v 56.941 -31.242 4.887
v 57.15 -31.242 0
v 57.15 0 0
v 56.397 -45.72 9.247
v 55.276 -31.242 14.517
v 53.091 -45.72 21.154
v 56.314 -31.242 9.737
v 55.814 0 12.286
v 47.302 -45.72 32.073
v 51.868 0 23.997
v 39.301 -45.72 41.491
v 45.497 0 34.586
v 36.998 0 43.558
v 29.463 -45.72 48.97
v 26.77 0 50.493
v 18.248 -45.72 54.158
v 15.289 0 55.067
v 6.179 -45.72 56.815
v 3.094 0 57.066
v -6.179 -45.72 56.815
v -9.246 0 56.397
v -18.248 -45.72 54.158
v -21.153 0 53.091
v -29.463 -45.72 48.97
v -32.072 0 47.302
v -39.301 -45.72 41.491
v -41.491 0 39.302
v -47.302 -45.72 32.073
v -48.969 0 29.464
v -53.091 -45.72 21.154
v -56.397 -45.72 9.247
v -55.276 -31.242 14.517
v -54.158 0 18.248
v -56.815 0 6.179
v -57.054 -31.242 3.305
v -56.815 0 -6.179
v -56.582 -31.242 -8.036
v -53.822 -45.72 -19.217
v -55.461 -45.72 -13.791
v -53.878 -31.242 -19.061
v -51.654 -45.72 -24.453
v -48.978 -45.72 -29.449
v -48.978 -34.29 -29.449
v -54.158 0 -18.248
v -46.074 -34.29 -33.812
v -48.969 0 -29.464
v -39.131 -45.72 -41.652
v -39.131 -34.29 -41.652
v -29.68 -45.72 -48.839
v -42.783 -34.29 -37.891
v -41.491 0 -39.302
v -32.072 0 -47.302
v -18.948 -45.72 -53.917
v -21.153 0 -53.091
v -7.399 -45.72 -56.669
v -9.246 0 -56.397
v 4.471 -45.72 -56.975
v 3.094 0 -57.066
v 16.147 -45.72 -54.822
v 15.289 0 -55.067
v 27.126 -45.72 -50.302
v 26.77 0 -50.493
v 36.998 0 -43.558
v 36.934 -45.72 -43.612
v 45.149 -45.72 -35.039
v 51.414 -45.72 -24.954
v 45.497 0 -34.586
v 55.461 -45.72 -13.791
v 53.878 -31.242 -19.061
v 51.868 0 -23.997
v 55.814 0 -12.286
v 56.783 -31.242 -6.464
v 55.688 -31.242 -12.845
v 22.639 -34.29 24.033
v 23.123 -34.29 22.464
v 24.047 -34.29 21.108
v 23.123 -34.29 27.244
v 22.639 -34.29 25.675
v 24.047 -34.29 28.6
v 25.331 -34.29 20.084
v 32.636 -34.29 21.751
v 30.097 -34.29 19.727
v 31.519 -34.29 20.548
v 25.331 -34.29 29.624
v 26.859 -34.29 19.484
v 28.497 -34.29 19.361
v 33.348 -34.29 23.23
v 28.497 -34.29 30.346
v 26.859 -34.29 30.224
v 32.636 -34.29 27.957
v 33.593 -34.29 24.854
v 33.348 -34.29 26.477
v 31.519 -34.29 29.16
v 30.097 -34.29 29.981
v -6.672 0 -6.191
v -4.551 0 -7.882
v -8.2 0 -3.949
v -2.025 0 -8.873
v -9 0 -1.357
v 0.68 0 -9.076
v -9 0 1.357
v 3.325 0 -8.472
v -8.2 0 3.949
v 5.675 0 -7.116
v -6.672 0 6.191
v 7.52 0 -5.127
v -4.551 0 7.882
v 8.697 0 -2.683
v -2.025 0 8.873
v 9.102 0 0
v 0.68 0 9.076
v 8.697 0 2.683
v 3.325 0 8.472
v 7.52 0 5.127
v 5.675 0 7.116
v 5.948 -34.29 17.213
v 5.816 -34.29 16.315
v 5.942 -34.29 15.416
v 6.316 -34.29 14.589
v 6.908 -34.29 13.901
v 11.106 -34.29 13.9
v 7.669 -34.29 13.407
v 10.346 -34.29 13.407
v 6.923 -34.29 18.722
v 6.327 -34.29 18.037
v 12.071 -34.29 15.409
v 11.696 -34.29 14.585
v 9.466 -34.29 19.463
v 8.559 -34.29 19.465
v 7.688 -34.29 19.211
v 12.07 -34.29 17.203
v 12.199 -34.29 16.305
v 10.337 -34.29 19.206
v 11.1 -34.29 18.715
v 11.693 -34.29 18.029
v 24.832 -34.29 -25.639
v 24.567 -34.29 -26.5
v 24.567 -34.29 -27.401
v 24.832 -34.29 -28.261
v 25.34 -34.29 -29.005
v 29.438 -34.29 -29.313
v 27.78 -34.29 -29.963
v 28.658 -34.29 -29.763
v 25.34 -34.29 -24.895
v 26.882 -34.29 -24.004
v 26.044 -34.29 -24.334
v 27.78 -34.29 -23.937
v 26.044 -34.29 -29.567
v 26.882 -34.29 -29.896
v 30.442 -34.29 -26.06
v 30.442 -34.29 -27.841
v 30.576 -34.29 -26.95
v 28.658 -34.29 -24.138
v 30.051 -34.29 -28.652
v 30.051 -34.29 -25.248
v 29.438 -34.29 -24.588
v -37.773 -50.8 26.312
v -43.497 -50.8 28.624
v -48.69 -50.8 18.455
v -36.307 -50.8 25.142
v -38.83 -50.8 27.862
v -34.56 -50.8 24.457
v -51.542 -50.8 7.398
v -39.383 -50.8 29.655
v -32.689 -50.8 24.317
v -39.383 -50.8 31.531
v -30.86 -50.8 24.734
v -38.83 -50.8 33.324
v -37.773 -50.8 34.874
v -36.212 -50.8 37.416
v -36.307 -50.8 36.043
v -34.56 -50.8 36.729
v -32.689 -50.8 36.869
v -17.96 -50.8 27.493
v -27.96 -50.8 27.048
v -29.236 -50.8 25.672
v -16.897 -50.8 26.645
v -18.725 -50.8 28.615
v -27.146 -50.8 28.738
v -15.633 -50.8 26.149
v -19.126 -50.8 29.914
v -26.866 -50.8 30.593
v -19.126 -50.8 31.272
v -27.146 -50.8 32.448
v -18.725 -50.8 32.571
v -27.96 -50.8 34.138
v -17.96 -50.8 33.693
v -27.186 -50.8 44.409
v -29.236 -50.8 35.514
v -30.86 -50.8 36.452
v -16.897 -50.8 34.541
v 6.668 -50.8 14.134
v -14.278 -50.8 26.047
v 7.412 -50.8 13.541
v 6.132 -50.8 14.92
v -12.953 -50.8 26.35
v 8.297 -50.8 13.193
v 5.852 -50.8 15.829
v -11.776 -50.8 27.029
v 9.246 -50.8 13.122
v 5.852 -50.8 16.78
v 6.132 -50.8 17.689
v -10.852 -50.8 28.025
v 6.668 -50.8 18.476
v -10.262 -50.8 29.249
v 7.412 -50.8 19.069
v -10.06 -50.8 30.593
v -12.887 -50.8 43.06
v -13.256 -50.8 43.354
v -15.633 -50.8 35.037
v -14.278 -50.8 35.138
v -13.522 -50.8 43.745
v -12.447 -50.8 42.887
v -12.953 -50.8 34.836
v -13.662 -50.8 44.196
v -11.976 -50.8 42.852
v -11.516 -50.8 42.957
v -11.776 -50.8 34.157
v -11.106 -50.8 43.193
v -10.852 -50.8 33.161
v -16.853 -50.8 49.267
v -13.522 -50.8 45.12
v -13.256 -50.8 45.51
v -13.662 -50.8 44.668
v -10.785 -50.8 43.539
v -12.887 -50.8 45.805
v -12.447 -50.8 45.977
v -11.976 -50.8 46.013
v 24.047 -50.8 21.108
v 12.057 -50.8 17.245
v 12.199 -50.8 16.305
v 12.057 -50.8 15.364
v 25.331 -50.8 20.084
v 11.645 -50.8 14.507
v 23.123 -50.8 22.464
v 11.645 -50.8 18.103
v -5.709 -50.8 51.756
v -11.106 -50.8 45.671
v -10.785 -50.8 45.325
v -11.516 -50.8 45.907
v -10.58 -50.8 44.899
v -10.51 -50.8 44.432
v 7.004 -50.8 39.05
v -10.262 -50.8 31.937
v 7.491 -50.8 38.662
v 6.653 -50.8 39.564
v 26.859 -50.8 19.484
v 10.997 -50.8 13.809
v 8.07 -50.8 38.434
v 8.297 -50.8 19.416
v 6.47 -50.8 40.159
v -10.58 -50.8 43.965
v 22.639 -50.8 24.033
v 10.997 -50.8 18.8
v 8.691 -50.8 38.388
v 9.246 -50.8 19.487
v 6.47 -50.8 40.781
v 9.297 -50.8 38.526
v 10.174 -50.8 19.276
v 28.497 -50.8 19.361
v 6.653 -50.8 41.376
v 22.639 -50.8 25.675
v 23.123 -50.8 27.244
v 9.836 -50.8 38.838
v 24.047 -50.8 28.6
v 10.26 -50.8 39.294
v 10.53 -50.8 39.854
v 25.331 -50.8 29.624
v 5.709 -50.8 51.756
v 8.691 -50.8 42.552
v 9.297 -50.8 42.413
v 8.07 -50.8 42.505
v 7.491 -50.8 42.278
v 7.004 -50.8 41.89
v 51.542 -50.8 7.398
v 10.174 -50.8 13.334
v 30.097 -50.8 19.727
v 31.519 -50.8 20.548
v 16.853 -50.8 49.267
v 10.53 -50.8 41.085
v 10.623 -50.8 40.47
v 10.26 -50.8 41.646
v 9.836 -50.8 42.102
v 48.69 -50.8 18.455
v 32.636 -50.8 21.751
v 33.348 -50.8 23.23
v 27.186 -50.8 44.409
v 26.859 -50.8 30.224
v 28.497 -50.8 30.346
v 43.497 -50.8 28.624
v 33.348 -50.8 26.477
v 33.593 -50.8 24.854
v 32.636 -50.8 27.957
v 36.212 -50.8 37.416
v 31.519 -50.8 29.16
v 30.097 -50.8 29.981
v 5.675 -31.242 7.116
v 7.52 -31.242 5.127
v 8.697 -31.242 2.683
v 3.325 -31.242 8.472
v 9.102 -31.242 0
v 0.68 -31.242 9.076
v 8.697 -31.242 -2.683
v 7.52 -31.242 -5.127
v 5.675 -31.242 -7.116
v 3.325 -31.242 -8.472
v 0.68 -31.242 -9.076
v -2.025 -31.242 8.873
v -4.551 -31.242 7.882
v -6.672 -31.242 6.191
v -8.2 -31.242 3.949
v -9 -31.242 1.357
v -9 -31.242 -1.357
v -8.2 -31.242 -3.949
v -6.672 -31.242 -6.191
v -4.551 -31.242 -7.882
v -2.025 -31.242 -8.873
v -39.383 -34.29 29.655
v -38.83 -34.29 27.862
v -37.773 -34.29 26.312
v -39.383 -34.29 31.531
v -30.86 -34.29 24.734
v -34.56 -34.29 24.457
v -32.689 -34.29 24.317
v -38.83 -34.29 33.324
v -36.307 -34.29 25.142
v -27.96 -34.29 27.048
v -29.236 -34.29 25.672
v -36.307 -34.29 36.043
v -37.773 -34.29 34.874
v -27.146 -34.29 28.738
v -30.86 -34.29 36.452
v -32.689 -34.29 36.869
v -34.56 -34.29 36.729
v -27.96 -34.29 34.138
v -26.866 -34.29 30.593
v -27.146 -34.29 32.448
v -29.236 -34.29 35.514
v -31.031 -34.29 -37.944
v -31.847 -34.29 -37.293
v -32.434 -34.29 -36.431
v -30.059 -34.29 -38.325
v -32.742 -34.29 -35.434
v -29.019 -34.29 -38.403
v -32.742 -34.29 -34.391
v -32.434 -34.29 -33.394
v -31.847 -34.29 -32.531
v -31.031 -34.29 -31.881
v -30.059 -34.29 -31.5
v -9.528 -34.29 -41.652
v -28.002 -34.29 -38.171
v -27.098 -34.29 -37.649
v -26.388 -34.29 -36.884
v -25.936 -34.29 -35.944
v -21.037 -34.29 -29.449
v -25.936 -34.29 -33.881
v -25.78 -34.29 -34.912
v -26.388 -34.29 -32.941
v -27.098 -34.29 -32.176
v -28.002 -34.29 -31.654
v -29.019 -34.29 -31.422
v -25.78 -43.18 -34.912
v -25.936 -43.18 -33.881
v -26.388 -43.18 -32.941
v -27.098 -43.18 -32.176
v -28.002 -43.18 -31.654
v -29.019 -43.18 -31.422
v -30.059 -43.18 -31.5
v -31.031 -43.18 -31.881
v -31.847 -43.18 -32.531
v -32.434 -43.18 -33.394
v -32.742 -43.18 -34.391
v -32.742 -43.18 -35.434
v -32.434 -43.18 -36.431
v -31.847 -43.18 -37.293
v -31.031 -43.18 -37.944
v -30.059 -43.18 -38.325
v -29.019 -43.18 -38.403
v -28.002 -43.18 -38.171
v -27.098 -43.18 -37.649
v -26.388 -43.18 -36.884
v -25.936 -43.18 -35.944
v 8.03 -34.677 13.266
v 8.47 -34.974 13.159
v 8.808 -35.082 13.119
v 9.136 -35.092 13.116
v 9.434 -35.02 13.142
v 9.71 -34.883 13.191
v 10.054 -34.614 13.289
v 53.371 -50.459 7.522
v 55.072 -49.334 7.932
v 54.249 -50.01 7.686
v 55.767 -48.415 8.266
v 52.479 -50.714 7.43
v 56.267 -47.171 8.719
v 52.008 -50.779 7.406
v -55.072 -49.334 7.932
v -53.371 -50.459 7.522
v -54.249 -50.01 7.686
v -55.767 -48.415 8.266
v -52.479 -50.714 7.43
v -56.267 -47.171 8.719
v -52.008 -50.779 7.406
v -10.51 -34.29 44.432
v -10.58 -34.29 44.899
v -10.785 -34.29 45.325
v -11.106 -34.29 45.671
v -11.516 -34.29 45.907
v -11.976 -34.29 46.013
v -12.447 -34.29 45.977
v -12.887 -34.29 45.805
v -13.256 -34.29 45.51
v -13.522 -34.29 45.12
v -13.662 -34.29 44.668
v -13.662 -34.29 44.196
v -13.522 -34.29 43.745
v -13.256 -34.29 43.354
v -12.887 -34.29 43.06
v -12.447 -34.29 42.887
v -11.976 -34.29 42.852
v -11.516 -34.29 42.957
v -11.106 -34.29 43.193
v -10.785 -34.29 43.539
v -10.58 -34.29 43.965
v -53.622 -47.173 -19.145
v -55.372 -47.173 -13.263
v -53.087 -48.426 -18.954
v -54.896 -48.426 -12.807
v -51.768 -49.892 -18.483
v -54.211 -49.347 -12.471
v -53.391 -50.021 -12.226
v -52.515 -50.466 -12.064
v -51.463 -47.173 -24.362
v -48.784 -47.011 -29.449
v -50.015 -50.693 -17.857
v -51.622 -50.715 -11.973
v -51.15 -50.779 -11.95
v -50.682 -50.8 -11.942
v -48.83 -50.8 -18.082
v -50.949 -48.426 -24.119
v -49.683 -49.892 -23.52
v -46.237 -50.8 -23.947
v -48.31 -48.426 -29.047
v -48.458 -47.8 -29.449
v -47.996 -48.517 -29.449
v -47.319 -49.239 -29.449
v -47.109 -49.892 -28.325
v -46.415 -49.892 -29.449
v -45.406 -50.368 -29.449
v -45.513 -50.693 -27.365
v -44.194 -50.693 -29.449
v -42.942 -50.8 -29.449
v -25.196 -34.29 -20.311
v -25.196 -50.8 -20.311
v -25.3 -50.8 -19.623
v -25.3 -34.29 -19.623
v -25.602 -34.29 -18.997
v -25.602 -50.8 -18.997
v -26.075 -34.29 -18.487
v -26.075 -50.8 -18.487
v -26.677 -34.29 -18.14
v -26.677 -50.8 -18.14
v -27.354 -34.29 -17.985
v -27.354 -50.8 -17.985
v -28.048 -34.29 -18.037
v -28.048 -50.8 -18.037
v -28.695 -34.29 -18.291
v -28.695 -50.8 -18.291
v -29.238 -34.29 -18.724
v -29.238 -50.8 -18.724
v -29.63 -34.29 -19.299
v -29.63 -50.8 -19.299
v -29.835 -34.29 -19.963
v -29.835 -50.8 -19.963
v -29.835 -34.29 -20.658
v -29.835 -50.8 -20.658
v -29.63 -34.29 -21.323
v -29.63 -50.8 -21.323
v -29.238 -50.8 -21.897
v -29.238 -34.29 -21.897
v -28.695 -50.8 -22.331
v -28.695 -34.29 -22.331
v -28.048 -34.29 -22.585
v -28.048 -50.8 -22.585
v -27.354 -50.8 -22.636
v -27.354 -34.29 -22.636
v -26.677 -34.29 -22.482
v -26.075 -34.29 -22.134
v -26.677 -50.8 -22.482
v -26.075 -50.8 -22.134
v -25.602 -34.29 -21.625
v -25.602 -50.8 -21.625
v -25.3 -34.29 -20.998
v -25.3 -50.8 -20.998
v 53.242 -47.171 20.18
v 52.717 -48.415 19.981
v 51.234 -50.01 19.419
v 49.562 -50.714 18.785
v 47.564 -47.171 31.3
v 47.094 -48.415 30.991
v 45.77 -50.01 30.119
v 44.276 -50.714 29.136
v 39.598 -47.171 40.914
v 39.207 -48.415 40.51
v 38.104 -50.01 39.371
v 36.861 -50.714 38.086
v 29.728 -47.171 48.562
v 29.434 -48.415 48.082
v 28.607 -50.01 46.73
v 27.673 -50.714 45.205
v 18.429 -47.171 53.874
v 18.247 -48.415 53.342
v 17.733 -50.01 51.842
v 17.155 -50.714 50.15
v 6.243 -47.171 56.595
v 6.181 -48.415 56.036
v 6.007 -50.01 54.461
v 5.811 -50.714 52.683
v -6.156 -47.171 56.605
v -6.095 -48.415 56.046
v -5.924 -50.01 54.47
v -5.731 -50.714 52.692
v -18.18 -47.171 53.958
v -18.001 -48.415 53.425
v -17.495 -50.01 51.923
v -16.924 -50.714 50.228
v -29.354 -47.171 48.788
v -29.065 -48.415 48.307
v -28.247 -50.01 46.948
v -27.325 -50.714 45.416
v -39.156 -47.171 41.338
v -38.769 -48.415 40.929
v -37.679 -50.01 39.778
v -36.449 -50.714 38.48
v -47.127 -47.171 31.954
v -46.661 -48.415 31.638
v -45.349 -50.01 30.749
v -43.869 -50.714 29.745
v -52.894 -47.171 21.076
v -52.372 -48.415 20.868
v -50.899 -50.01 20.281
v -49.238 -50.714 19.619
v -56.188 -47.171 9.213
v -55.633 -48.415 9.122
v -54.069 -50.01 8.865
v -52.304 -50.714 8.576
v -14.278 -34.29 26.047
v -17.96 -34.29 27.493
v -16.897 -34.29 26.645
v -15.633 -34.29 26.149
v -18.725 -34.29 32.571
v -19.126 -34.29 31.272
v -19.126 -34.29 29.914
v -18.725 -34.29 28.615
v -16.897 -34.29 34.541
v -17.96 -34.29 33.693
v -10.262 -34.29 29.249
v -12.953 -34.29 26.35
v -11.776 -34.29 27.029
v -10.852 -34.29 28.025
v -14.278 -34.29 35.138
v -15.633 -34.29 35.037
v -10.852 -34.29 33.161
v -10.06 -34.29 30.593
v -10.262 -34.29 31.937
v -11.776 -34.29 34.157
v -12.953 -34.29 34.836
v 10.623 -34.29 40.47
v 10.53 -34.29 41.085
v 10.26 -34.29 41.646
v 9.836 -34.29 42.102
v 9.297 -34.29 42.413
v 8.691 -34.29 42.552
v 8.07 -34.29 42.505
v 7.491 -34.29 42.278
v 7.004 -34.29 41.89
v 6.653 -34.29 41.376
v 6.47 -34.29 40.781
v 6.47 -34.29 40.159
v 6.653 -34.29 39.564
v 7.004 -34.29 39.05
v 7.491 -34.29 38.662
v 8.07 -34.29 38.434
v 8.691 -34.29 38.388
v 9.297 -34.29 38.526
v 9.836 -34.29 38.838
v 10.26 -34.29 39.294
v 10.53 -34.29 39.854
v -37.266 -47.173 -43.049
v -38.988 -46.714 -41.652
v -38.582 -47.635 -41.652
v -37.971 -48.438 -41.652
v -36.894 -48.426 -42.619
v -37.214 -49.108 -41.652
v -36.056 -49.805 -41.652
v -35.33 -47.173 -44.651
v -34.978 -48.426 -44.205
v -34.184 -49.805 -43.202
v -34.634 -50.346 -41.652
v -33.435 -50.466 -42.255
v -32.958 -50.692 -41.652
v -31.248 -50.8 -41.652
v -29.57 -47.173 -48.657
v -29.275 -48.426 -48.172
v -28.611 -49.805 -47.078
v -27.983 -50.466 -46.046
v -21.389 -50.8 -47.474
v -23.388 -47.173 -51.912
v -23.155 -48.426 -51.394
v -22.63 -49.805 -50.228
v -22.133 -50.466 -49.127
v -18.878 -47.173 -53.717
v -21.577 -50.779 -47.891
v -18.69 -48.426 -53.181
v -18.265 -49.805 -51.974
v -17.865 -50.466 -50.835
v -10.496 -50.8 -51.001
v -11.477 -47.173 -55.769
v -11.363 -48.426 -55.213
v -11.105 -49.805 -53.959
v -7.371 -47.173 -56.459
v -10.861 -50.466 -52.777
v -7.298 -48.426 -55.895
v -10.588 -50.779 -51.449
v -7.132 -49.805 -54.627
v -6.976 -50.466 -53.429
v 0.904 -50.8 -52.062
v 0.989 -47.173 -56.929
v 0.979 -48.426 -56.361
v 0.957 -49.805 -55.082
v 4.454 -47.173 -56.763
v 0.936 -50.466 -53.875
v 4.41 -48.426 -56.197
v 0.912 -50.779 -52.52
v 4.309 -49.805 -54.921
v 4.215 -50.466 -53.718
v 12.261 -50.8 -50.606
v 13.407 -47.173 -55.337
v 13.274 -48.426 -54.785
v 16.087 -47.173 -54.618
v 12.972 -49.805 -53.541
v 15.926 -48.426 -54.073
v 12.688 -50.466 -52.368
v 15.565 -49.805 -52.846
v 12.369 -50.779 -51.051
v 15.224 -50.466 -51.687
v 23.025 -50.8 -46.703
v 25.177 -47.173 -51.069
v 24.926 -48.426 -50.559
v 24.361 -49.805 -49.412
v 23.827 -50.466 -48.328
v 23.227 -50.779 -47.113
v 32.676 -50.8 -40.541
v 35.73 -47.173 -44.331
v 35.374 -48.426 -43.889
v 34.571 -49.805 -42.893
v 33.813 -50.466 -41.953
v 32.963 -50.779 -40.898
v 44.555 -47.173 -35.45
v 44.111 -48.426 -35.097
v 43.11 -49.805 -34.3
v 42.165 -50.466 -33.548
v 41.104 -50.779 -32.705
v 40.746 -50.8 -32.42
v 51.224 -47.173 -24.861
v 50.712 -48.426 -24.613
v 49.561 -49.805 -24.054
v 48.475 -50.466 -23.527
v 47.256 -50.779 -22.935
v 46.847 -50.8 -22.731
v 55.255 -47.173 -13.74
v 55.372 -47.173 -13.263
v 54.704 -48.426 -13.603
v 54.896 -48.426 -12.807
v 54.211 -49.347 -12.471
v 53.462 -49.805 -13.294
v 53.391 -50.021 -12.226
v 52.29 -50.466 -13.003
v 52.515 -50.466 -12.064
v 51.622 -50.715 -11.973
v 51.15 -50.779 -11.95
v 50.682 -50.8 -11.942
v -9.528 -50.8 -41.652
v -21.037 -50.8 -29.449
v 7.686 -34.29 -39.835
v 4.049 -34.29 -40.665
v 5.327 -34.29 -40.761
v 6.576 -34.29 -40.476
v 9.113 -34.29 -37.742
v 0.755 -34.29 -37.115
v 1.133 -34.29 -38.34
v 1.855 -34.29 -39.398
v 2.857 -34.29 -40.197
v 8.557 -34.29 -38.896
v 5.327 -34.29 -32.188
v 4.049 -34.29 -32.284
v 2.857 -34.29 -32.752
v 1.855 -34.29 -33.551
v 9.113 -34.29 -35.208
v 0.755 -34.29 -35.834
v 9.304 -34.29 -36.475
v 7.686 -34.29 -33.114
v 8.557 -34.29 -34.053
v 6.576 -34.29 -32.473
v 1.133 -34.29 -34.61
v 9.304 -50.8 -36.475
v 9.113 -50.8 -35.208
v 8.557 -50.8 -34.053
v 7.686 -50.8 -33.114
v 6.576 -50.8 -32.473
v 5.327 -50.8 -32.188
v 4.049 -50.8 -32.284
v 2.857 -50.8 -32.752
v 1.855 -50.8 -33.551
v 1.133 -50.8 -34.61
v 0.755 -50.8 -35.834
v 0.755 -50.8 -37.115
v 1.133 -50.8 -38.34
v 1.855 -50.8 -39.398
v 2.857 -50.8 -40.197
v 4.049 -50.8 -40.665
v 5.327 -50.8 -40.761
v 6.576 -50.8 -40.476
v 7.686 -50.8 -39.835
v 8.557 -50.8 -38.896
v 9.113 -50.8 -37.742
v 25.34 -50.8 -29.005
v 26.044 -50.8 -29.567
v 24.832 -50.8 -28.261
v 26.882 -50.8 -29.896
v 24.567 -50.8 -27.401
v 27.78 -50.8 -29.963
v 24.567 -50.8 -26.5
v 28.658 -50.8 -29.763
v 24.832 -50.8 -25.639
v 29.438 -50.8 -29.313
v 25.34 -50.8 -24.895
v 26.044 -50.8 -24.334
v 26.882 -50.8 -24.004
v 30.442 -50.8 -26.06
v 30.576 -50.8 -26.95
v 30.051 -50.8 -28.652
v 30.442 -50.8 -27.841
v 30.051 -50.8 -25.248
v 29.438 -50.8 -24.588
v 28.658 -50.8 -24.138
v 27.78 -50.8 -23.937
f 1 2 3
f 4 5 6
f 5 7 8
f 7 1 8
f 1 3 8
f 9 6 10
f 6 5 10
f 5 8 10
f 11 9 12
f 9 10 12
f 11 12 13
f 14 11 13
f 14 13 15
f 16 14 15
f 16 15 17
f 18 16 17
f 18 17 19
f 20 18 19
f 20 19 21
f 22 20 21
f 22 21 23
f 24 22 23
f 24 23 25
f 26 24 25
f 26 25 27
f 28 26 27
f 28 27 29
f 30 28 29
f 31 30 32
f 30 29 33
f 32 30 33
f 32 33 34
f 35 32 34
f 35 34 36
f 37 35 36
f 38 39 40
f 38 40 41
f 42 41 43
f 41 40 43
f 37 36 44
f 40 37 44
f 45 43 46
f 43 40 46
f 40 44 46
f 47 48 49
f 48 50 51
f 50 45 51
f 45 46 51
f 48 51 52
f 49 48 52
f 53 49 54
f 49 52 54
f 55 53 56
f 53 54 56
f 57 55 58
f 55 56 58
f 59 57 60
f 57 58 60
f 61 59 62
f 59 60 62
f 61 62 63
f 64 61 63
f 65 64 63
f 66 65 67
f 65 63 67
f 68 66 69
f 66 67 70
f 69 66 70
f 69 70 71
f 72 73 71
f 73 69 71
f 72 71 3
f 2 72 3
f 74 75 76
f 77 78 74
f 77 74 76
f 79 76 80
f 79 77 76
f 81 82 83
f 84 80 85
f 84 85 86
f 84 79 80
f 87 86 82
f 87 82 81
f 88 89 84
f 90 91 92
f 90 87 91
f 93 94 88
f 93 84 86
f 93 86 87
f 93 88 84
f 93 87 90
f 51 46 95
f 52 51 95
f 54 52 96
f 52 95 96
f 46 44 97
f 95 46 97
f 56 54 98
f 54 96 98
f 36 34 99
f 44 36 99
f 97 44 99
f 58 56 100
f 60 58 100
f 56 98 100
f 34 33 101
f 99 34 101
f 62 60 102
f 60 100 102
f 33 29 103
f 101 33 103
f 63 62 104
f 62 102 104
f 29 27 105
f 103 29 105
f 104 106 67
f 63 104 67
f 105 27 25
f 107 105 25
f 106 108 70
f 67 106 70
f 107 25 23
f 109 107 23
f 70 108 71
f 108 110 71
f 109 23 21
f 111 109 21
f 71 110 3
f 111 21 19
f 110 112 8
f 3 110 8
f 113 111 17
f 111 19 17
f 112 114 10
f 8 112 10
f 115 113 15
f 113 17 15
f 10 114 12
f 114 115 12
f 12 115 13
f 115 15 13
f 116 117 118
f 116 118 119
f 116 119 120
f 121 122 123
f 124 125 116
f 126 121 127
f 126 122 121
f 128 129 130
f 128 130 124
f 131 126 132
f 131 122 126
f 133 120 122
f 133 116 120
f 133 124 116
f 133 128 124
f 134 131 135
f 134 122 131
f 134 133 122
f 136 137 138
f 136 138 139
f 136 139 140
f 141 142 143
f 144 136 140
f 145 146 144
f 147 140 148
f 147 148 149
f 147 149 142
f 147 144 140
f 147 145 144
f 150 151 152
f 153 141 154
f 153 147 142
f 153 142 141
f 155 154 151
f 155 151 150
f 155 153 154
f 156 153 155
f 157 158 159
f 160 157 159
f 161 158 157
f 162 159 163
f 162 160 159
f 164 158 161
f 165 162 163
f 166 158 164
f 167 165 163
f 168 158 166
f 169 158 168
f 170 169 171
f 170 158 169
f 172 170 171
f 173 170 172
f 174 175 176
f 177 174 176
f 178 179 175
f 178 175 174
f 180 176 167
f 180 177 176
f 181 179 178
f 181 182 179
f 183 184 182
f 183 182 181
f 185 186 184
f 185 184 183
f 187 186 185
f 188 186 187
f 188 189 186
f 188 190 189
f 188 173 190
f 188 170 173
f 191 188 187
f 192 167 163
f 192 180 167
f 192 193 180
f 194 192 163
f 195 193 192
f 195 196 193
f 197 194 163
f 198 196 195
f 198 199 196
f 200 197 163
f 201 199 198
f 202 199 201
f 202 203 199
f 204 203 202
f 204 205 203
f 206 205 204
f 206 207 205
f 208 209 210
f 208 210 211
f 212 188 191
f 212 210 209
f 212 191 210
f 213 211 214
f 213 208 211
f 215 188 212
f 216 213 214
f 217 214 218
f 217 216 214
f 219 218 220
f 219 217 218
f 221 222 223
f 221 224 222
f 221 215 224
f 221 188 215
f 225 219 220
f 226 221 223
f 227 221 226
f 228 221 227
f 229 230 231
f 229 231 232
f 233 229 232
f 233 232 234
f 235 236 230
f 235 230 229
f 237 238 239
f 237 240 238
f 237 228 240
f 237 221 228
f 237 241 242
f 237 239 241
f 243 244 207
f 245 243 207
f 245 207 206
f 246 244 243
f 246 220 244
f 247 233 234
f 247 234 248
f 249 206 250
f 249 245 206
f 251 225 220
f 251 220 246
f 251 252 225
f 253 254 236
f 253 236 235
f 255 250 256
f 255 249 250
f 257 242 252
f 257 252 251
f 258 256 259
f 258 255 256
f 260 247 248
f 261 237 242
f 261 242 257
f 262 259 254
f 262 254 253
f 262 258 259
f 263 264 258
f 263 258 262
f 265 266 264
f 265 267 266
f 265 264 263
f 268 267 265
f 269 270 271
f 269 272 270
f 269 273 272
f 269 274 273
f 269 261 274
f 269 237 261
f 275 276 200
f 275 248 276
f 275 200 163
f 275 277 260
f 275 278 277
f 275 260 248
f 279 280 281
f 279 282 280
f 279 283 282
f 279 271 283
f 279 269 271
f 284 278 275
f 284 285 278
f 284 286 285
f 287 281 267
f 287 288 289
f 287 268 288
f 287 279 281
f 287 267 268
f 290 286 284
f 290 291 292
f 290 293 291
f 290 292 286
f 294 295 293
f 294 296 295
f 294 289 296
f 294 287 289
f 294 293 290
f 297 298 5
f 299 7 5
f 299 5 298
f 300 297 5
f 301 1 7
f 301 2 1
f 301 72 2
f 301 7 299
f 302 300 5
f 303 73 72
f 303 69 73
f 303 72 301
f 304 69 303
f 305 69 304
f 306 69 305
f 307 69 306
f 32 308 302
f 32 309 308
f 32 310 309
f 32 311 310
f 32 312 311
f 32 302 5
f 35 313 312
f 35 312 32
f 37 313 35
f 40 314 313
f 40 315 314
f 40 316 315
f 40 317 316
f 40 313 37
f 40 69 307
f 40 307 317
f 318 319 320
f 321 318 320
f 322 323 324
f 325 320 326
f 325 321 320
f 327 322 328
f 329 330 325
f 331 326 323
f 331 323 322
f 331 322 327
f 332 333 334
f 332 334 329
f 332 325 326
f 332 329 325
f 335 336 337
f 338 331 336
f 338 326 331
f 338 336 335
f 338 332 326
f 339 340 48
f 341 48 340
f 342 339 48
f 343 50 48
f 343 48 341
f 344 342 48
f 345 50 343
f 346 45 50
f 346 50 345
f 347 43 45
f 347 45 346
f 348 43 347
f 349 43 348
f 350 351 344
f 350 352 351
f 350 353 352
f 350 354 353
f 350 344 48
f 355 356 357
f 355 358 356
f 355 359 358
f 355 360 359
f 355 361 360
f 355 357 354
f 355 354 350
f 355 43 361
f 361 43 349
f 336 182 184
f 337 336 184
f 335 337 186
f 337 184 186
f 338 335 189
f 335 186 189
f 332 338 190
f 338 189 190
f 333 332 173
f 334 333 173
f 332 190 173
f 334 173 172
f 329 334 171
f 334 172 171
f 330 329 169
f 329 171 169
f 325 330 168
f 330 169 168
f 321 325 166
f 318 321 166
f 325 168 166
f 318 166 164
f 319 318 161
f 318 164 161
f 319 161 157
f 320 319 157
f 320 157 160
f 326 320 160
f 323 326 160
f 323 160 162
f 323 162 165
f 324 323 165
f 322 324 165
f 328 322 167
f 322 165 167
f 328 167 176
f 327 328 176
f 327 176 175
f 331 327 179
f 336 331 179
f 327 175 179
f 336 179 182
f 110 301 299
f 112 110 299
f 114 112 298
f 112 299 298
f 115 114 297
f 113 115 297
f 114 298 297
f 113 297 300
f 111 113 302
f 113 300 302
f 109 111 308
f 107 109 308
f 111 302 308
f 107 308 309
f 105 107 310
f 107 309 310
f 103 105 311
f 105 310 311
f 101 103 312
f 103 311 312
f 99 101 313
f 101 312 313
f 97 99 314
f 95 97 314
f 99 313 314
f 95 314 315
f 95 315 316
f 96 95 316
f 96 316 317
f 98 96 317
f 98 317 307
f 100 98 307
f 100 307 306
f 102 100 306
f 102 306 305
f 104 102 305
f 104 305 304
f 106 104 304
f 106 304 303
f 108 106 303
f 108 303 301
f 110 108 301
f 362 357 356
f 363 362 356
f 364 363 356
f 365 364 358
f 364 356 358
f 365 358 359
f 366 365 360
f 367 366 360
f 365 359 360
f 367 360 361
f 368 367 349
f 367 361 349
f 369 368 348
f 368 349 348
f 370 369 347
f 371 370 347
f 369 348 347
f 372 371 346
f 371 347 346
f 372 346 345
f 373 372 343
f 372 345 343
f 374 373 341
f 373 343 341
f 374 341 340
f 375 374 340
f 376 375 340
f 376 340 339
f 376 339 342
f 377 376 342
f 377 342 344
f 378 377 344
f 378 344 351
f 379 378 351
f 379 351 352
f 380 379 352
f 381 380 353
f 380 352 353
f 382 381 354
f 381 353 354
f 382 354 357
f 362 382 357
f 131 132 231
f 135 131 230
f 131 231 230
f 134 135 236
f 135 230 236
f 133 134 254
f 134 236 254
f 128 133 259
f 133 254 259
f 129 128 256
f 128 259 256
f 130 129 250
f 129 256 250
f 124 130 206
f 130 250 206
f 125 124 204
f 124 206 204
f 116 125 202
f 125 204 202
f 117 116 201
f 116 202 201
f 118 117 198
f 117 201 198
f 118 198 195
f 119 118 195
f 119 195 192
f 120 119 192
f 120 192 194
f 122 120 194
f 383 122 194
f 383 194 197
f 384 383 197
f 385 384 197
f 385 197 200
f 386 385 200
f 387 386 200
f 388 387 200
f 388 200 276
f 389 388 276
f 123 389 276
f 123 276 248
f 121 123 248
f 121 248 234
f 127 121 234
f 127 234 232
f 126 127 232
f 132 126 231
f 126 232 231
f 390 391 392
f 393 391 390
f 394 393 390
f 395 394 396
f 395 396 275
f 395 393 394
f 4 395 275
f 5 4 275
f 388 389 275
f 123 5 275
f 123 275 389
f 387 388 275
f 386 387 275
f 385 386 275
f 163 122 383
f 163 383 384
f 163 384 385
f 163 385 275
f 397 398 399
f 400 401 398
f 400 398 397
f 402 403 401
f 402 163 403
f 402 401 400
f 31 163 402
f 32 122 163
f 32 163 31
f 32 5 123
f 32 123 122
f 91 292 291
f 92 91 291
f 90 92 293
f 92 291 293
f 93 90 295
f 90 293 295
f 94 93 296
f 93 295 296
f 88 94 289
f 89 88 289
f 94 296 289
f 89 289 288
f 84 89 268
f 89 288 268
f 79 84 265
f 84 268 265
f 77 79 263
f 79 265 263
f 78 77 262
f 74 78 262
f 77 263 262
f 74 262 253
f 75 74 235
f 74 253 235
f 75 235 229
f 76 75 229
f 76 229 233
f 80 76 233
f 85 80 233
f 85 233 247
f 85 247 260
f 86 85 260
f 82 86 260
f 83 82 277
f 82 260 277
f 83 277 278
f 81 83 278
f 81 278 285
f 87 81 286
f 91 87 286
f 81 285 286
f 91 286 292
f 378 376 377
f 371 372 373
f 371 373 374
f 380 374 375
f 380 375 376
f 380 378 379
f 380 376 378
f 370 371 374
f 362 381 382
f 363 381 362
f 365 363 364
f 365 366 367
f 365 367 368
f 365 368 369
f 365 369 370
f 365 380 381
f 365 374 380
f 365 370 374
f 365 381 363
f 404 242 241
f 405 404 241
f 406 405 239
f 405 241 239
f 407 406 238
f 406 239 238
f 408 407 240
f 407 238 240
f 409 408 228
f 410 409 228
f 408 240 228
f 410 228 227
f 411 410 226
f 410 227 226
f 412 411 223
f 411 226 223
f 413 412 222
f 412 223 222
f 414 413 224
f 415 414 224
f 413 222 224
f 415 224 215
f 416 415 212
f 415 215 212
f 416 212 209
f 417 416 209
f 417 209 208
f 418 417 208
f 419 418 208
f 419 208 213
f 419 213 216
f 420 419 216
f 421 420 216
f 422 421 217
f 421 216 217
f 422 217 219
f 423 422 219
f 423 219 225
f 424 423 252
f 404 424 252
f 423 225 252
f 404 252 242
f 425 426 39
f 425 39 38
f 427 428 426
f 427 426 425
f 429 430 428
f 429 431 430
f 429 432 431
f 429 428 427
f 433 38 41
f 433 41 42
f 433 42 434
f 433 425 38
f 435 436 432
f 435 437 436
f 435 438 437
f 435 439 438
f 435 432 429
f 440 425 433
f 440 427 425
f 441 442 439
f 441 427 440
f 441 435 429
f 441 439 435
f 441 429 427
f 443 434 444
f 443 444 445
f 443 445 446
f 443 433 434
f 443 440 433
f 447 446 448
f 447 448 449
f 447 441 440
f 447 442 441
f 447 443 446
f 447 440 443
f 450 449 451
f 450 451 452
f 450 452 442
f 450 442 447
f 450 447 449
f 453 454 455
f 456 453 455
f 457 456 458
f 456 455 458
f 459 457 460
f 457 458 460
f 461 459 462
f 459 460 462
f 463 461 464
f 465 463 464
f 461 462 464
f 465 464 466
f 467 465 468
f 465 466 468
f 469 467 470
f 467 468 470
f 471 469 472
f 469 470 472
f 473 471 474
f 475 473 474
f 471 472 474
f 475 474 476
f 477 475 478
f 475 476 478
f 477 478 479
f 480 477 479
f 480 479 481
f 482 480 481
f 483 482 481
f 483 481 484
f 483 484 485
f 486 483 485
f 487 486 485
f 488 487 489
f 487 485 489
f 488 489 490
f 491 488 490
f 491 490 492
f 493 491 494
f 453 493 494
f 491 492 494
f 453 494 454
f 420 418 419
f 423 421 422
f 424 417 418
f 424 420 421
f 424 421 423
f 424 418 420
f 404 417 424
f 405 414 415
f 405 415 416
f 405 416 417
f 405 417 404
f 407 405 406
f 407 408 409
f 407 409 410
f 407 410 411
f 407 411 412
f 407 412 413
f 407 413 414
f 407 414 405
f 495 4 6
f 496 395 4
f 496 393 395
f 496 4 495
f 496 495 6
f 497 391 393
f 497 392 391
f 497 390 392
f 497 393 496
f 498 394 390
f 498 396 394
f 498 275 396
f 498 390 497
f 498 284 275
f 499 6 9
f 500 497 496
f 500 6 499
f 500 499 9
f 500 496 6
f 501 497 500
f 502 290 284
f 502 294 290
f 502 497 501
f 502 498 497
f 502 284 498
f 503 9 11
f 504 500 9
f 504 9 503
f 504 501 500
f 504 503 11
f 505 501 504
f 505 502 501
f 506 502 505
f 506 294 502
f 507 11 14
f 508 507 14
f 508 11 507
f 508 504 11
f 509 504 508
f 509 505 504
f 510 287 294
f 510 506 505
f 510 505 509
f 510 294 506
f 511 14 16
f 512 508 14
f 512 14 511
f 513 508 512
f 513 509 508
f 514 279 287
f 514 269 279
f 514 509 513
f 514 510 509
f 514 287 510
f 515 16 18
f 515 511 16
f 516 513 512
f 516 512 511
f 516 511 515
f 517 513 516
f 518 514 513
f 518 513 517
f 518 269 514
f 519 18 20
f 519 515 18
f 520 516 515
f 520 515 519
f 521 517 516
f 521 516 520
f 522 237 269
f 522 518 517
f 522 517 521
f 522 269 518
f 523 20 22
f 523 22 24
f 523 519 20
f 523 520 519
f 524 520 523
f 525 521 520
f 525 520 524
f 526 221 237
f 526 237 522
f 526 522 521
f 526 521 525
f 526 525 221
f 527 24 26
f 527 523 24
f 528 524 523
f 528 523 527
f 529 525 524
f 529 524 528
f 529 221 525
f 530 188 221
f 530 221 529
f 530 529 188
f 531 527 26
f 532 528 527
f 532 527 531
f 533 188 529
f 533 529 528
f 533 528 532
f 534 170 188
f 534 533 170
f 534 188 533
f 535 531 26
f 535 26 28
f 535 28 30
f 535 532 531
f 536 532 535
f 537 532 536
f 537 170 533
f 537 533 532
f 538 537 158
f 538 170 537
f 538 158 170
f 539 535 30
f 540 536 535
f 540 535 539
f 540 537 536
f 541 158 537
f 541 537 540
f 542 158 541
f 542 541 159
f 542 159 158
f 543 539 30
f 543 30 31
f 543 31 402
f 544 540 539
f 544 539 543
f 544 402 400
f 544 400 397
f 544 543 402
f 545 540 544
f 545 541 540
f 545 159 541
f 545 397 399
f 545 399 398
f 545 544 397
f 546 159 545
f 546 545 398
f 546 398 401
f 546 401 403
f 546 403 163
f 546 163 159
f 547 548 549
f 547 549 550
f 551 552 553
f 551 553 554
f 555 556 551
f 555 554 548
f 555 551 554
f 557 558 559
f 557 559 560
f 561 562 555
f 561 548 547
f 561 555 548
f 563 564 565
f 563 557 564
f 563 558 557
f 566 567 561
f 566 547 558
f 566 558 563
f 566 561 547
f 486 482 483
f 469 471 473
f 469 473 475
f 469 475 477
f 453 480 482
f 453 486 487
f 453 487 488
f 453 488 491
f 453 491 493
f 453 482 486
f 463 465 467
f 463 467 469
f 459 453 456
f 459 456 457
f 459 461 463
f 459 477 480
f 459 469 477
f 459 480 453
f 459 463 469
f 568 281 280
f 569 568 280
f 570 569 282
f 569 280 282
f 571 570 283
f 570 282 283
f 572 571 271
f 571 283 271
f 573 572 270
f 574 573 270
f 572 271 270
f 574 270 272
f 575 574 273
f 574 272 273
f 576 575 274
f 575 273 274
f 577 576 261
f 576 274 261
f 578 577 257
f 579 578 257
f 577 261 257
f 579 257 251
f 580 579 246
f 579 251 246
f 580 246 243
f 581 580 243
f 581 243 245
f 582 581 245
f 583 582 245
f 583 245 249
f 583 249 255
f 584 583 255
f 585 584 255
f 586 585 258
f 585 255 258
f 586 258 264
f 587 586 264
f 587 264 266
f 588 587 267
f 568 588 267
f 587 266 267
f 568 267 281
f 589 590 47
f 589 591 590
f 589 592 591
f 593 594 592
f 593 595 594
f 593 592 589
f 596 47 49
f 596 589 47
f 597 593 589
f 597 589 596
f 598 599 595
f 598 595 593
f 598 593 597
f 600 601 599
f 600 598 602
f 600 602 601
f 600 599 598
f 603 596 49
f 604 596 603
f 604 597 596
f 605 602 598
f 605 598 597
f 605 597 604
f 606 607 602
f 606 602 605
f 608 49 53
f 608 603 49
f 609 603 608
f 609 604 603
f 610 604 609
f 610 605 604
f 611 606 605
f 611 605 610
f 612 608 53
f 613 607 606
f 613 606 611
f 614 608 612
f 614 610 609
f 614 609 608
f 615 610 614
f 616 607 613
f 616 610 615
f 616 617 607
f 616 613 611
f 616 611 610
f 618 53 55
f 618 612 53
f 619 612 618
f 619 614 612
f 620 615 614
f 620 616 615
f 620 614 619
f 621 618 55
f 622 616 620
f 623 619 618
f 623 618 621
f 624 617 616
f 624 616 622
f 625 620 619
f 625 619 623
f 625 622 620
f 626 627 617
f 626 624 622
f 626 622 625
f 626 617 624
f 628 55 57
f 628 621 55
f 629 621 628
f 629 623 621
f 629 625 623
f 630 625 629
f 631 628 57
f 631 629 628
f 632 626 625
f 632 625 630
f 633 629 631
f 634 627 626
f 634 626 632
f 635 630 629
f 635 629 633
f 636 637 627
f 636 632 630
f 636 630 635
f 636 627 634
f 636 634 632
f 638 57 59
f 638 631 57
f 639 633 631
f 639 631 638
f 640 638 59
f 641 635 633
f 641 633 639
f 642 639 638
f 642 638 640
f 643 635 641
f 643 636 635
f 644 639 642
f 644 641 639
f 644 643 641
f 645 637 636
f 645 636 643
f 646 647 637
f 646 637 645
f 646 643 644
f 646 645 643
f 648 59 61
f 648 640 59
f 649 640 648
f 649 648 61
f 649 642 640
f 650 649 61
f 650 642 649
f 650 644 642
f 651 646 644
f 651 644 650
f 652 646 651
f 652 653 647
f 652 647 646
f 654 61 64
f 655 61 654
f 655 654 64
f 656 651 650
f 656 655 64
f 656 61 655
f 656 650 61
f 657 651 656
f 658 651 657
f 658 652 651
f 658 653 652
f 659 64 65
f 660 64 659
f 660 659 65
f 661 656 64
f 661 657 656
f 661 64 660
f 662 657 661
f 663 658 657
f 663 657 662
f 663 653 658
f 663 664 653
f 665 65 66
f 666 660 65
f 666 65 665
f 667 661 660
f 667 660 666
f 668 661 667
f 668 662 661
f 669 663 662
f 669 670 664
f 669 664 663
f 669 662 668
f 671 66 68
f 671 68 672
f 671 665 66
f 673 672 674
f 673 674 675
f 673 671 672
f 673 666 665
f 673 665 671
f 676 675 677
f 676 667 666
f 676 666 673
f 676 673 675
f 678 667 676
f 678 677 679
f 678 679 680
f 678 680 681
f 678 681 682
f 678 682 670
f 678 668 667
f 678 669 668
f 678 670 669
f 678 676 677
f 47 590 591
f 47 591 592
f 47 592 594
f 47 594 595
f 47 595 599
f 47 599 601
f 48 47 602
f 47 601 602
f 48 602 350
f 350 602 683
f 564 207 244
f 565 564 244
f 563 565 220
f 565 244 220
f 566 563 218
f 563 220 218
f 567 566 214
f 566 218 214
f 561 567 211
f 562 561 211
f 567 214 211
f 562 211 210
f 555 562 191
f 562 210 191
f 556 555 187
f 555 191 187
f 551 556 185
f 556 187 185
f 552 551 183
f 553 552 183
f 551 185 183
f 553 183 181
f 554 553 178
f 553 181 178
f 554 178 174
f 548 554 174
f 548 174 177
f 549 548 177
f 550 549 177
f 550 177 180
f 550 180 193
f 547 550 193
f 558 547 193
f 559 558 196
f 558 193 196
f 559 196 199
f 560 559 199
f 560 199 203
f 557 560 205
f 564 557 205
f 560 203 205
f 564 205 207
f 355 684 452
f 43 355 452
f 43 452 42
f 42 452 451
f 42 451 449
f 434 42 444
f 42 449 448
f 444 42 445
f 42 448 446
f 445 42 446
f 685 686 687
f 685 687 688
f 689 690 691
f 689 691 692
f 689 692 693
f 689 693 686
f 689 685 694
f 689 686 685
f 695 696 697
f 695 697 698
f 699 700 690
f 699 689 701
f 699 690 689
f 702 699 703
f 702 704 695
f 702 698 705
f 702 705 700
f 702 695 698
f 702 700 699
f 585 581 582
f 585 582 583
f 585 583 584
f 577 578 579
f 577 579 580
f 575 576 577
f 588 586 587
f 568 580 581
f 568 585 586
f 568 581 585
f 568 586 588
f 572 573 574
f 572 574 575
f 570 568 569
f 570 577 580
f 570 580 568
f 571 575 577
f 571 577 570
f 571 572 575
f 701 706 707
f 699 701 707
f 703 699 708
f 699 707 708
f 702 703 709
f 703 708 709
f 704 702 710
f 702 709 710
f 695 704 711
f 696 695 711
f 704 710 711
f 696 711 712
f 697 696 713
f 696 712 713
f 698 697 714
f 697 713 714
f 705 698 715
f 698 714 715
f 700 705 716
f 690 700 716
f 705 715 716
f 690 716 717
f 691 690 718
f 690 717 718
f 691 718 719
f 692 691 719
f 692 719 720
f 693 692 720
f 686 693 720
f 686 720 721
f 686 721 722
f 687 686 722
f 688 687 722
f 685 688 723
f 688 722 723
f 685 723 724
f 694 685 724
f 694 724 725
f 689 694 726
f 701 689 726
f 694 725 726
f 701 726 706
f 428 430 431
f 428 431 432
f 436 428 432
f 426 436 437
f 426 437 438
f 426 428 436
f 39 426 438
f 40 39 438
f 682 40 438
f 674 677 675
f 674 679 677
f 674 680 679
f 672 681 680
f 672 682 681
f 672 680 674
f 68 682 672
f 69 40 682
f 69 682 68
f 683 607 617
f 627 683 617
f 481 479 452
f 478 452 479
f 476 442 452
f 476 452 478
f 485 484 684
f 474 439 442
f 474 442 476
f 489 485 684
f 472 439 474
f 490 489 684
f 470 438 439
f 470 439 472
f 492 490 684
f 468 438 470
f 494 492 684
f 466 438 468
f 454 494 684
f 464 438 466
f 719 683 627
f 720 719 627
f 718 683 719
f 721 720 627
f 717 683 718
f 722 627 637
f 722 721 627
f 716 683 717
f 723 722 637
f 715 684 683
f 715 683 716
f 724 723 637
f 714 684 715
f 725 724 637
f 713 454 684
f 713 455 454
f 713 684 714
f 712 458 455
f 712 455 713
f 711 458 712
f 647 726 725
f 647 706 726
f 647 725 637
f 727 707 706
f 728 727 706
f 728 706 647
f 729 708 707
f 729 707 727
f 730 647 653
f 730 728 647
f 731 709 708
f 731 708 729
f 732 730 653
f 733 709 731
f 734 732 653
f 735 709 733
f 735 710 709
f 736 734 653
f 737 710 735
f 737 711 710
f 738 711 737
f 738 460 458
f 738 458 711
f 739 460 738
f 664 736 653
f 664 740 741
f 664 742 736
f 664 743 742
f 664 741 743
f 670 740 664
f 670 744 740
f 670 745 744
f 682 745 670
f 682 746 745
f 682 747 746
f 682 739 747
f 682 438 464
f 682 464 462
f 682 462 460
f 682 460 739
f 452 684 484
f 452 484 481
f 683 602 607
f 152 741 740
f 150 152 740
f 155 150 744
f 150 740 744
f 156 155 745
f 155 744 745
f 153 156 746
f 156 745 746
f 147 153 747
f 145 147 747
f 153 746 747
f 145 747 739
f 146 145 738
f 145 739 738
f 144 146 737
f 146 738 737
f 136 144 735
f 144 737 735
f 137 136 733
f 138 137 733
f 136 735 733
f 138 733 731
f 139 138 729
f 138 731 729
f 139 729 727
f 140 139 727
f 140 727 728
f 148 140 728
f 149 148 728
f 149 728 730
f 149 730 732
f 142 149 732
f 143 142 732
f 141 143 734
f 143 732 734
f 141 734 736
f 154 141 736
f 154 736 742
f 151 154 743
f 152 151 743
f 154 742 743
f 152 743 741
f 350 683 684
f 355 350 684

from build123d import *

# Parameters (mm, degrees)
F0_R      = 57.15
F1_DEPTH  = 50.8
F3_DEPTH  = 19.558
F3_TAPER  = -20
F4_R      = 6.2936764169
F4_R_2    = 4.5582731786
F4_R_3    = 3.0215351301
F4_R_4    = 4.2985160405
F4_R_5    = 2.3322780101
F4_R_6    = 3.1916024355
F4_R_7    = 2.0879014362
F4_R_8    = 5.5078897411
F4_R_9    = 1.5847885442
F5_DEPTH  = 16.51
F6_R      = 3.5004361301
F7_DEPTH  = 8.89
F8_R      = 5.08
F9_R      = 5.08
F10_R     = 5.08
F11_R     = 9.1016628177
F12_DEPTH = 31.2430001


with BuildPart() as f1:
    # F0 (on Front) → F1 (new body)
    with BuildSketch(Plane.XZ):
        Circle(F0_R)
    extrude(amount=F1_DEPTH)

    # F2 (on face) → F3 (cut)
    with BuildSketch(Plane.XZ.offset(50.8)):
        with BuildLine():
            Line((56.6691125389, 7.398255474), (-56.6691125389, 7.398255474))
            ThreePointArc((-56.6691125389, 7.398255474), (-57.103483703, -2.3053522456), (-55.8883030293, -11.9423651134))
            Line((-55.8883030293, -11.9423651134), (55.8883030293, -11.9423651134))
            ThreePointArc((55.8883030293, -11.9423651134), (56.8337004696, -6.0044142876), (57.15, 0))
            ThreePointArc((57.15, 0), (57.0296514175, 3.7069339355), (56.6691125389, 7.398255474))
        make_face()
    extrude(amount=-F3_DEPTH, taper=F3_TAPER, mode=Mode.SUBTRACT)

    # F4 (on face) → F5 (cut)
    with BuildSketch(Plane.XZ.offset(50.8)):
        with Locations((-33.159788698, 30.5929593742)):
            Circle(F4_R)
        with Locations((-14.6182132885, 30.5929593742)):
            Circle(F4_R_2)
        with Locations((27.5545194745, -26.9502550364)):
            Circle(F4_R_3)
        with Locations((5.0058867782, -36.4746116102)):
            Circle(F4_R_4)
        with Locations((-27.5286901742, -20.31073533)):
            Circle(F4_R_5)
        with Locations((9.0075330809, 16.3046922535)):
            Circle(F4_R_6)
        with Locations((8.5346112028, 40.4698885977)):
            Circle(F4_R_7)
        with Locations((28.0849561095, 24.853952229)):
            Circle(F4_R_8)
        Polygon((-9.5280949026, -41.6518002748), (-21.0372693837, -29.4488035142), (-54.37650159, -29.4488035142), (-54.37650159, -41.6518002748), align=None)
        with Locations((-12.0945619419, 44.4322191179)):
            Circle(F4_R_9)
    extrude(amount=-F5_DEPTH, mode=Mode.SUBTRACT)

    # F6 (on face) → F7 (join)
    with BuildSketch(Plane.XZ.offset(34.29)):
        with Locations((-29.2805414647, -34.9123850465)):
            Circle(F6_R)
    extrude(amount=F7_DEPTH)

    # F8
    f8_edges = [f1.edges().sort_by_distance(p)[0] for p in [
        (17.054702, -50.8, -54.545941),
    ]]
    fillet(f8_edges, radius=F8_R)

    # F9
    f9_edges = [f1.edges().sort_by_distance(p)[0] for p in [
        (0, -50.8, 57.15),
    ]]
    fillet(f9_edges, radius=F9_R)

    # F10
    f10_edges = [f1.edges().sort_by_distance(p)[0] for p in [
        (-53.158996, -50.8, -20.981984),
    ]]
    fillet(f10_edges, radius=F10_R)

    # F11 (on face) → F12 (cut, through all)
    with BuildSketch(Plane.XZ.offset(31.242)):
        Circle(F11_R)
    extrude(amount=-F12_DEPTH, mode=Mode.SUBTRACT)


solid = f1.part
